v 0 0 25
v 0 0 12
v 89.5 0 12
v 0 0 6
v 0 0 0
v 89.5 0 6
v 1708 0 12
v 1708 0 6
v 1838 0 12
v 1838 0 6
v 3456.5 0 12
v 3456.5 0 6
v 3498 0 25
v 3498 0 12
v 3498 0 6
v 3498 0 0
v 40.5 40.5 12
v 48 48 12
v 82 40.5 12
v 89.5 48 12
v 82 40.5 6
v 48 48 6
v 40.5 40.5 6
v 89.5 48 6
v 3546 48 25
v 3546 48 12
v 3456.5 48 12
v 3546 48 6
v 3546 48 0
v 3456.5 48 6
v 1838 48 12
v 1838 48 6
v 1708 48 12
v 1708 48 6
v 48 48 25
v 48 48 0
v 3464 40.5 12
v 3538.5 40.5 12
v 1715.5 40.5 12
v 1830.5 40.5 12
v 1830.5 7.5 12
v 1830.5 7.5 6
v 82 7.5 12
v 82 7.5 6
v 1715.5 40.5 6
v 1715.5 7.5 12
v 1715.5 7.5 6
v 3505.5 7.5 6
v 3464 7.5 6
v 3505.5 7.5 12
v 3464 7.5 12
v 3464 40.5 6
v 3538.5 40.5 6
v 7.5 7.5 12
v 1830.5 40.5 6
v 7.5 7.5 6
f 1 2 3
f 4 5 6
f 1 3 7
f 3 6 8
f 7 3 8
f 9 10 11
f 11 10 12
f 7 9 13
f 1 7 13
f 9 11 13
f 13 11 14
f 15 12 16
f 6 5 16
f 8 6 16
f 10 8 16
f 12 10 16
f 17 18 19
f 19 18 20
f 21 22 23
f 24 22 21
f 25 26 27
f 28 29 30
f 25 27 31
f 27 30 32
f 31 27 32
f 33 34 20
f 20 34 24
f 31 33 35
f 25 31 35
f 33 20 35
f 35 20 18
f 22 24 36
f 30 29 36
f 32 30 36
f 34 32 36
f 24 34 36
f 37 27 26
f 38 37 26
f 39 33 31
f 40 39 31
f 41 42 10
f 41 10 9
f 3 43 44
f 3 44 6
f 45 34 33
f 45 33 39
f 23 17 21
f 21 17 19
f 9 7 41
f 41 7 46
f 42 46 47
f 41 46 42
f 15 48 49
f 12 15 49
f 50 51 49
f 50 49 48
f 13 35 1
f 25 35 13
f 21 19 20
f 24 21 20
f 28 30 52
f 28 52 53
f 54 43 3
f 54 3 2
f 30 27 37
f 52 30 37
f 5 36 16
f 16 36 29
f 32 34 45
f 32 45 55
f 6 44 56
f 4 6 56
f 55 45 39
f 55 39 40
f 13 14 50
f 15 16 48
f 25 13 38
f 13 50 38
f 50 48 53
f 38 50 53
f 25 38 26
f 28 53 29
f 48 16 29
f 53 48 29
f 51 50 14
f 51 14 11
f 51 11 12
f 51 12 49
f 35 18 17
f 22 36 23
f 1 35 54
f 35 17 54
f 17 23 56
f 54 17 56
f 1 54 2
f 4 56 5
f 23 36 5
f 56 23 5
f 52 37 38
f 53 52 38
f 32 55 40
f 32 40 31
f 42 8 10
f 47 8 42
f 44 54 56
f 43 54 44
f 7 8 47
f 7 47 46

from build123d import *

# Parameters (mm, degrees)
EXTRUDE_1_DEPTH     = 25
SKETCH_2_W          = 115
SKETCH_2_H          = 6
CUT_EXTRUDE_1_DEPTH = 7.5
DRAFT_1_ANGLE       = 45
MIRROR_START        = 6
MIRROR_1_DEPTH      = 6
CUT_EXTRUDE_START   = -13
CUT_EXTRUDE_2_DEPTH = 6


# Read off the part's stored shape, not the designer's step: 镜向1
with BuildPart() as part:
    # 草图1 → 凸台-拉伸1 (new body)
    with BuildSketch(Plane.XY):
        Polygon((48, 48), (0, 0), (3498, 0), (3546, 48), align=None)
    extrude(amount=EXTRUDE_1_DEPTH)

    # 草图2 → 切除-拉伸1 (cut)
    with BuildSketch(Plane.XZ):
        with Locations((1773, 9)):
            Rectangle(SKETCH_2_W, SKETCH_2_H)
    extrude(amount=-CUT_EXTRUDE_1_DEPTH, mode=Mode.SUBTRACT)

    # 拔模1
    draft_1_faces = [part.faces().sort_by_distance(p)[0] for p in [
        (1830.5, 3.75, 9),
        (1715.5, 3.75, 9),
    ]]
    draft(draft_1_faces, Plane(origin=(0, 7.5, 0), x_dir=(0, 0, -1), z_dir=(0, -1, 0)), DRAFT_1_ANGLE)

    # 镜向1 outline → 镜向1 (cut)
    with BuildSketch(Plane.XY.offset(MIRROR_START)):
        Polygon((1708, 48), (1715.5, 40.5), (1830.5, 40.5), (1838, 48), align=None)
    extrude(amount=MIRROR_1_DEPTH, mode=Mode.SUBTRACT)

    # 草图3 → 切除-拉伸2 (cut)
    with BuildSketch(Plane.XY.offset(25).offset(CUT_EXTRUDE_START)):
        Polygon((3456.5, 48), (3464, 40.5), (3538.5, 40.5), (3546, 48), align=None)
        Polygon((3456.5, 0), (3464, 7.5), (3505.5, 7.5), (3498, 0), align=None)
        Polygon((48, 48), (40.5, 40.5), (82, 40.5), (89.5, 48), align=None)
        Polygon((0, 0), (7.5, 7.5), (82, 7.5), (89.5, 0), align=None)
    extrude(amount=-CUT_EXTRUDE_2_DEPTH, mode=Mode.SUBTRACT)


solid = part.part
